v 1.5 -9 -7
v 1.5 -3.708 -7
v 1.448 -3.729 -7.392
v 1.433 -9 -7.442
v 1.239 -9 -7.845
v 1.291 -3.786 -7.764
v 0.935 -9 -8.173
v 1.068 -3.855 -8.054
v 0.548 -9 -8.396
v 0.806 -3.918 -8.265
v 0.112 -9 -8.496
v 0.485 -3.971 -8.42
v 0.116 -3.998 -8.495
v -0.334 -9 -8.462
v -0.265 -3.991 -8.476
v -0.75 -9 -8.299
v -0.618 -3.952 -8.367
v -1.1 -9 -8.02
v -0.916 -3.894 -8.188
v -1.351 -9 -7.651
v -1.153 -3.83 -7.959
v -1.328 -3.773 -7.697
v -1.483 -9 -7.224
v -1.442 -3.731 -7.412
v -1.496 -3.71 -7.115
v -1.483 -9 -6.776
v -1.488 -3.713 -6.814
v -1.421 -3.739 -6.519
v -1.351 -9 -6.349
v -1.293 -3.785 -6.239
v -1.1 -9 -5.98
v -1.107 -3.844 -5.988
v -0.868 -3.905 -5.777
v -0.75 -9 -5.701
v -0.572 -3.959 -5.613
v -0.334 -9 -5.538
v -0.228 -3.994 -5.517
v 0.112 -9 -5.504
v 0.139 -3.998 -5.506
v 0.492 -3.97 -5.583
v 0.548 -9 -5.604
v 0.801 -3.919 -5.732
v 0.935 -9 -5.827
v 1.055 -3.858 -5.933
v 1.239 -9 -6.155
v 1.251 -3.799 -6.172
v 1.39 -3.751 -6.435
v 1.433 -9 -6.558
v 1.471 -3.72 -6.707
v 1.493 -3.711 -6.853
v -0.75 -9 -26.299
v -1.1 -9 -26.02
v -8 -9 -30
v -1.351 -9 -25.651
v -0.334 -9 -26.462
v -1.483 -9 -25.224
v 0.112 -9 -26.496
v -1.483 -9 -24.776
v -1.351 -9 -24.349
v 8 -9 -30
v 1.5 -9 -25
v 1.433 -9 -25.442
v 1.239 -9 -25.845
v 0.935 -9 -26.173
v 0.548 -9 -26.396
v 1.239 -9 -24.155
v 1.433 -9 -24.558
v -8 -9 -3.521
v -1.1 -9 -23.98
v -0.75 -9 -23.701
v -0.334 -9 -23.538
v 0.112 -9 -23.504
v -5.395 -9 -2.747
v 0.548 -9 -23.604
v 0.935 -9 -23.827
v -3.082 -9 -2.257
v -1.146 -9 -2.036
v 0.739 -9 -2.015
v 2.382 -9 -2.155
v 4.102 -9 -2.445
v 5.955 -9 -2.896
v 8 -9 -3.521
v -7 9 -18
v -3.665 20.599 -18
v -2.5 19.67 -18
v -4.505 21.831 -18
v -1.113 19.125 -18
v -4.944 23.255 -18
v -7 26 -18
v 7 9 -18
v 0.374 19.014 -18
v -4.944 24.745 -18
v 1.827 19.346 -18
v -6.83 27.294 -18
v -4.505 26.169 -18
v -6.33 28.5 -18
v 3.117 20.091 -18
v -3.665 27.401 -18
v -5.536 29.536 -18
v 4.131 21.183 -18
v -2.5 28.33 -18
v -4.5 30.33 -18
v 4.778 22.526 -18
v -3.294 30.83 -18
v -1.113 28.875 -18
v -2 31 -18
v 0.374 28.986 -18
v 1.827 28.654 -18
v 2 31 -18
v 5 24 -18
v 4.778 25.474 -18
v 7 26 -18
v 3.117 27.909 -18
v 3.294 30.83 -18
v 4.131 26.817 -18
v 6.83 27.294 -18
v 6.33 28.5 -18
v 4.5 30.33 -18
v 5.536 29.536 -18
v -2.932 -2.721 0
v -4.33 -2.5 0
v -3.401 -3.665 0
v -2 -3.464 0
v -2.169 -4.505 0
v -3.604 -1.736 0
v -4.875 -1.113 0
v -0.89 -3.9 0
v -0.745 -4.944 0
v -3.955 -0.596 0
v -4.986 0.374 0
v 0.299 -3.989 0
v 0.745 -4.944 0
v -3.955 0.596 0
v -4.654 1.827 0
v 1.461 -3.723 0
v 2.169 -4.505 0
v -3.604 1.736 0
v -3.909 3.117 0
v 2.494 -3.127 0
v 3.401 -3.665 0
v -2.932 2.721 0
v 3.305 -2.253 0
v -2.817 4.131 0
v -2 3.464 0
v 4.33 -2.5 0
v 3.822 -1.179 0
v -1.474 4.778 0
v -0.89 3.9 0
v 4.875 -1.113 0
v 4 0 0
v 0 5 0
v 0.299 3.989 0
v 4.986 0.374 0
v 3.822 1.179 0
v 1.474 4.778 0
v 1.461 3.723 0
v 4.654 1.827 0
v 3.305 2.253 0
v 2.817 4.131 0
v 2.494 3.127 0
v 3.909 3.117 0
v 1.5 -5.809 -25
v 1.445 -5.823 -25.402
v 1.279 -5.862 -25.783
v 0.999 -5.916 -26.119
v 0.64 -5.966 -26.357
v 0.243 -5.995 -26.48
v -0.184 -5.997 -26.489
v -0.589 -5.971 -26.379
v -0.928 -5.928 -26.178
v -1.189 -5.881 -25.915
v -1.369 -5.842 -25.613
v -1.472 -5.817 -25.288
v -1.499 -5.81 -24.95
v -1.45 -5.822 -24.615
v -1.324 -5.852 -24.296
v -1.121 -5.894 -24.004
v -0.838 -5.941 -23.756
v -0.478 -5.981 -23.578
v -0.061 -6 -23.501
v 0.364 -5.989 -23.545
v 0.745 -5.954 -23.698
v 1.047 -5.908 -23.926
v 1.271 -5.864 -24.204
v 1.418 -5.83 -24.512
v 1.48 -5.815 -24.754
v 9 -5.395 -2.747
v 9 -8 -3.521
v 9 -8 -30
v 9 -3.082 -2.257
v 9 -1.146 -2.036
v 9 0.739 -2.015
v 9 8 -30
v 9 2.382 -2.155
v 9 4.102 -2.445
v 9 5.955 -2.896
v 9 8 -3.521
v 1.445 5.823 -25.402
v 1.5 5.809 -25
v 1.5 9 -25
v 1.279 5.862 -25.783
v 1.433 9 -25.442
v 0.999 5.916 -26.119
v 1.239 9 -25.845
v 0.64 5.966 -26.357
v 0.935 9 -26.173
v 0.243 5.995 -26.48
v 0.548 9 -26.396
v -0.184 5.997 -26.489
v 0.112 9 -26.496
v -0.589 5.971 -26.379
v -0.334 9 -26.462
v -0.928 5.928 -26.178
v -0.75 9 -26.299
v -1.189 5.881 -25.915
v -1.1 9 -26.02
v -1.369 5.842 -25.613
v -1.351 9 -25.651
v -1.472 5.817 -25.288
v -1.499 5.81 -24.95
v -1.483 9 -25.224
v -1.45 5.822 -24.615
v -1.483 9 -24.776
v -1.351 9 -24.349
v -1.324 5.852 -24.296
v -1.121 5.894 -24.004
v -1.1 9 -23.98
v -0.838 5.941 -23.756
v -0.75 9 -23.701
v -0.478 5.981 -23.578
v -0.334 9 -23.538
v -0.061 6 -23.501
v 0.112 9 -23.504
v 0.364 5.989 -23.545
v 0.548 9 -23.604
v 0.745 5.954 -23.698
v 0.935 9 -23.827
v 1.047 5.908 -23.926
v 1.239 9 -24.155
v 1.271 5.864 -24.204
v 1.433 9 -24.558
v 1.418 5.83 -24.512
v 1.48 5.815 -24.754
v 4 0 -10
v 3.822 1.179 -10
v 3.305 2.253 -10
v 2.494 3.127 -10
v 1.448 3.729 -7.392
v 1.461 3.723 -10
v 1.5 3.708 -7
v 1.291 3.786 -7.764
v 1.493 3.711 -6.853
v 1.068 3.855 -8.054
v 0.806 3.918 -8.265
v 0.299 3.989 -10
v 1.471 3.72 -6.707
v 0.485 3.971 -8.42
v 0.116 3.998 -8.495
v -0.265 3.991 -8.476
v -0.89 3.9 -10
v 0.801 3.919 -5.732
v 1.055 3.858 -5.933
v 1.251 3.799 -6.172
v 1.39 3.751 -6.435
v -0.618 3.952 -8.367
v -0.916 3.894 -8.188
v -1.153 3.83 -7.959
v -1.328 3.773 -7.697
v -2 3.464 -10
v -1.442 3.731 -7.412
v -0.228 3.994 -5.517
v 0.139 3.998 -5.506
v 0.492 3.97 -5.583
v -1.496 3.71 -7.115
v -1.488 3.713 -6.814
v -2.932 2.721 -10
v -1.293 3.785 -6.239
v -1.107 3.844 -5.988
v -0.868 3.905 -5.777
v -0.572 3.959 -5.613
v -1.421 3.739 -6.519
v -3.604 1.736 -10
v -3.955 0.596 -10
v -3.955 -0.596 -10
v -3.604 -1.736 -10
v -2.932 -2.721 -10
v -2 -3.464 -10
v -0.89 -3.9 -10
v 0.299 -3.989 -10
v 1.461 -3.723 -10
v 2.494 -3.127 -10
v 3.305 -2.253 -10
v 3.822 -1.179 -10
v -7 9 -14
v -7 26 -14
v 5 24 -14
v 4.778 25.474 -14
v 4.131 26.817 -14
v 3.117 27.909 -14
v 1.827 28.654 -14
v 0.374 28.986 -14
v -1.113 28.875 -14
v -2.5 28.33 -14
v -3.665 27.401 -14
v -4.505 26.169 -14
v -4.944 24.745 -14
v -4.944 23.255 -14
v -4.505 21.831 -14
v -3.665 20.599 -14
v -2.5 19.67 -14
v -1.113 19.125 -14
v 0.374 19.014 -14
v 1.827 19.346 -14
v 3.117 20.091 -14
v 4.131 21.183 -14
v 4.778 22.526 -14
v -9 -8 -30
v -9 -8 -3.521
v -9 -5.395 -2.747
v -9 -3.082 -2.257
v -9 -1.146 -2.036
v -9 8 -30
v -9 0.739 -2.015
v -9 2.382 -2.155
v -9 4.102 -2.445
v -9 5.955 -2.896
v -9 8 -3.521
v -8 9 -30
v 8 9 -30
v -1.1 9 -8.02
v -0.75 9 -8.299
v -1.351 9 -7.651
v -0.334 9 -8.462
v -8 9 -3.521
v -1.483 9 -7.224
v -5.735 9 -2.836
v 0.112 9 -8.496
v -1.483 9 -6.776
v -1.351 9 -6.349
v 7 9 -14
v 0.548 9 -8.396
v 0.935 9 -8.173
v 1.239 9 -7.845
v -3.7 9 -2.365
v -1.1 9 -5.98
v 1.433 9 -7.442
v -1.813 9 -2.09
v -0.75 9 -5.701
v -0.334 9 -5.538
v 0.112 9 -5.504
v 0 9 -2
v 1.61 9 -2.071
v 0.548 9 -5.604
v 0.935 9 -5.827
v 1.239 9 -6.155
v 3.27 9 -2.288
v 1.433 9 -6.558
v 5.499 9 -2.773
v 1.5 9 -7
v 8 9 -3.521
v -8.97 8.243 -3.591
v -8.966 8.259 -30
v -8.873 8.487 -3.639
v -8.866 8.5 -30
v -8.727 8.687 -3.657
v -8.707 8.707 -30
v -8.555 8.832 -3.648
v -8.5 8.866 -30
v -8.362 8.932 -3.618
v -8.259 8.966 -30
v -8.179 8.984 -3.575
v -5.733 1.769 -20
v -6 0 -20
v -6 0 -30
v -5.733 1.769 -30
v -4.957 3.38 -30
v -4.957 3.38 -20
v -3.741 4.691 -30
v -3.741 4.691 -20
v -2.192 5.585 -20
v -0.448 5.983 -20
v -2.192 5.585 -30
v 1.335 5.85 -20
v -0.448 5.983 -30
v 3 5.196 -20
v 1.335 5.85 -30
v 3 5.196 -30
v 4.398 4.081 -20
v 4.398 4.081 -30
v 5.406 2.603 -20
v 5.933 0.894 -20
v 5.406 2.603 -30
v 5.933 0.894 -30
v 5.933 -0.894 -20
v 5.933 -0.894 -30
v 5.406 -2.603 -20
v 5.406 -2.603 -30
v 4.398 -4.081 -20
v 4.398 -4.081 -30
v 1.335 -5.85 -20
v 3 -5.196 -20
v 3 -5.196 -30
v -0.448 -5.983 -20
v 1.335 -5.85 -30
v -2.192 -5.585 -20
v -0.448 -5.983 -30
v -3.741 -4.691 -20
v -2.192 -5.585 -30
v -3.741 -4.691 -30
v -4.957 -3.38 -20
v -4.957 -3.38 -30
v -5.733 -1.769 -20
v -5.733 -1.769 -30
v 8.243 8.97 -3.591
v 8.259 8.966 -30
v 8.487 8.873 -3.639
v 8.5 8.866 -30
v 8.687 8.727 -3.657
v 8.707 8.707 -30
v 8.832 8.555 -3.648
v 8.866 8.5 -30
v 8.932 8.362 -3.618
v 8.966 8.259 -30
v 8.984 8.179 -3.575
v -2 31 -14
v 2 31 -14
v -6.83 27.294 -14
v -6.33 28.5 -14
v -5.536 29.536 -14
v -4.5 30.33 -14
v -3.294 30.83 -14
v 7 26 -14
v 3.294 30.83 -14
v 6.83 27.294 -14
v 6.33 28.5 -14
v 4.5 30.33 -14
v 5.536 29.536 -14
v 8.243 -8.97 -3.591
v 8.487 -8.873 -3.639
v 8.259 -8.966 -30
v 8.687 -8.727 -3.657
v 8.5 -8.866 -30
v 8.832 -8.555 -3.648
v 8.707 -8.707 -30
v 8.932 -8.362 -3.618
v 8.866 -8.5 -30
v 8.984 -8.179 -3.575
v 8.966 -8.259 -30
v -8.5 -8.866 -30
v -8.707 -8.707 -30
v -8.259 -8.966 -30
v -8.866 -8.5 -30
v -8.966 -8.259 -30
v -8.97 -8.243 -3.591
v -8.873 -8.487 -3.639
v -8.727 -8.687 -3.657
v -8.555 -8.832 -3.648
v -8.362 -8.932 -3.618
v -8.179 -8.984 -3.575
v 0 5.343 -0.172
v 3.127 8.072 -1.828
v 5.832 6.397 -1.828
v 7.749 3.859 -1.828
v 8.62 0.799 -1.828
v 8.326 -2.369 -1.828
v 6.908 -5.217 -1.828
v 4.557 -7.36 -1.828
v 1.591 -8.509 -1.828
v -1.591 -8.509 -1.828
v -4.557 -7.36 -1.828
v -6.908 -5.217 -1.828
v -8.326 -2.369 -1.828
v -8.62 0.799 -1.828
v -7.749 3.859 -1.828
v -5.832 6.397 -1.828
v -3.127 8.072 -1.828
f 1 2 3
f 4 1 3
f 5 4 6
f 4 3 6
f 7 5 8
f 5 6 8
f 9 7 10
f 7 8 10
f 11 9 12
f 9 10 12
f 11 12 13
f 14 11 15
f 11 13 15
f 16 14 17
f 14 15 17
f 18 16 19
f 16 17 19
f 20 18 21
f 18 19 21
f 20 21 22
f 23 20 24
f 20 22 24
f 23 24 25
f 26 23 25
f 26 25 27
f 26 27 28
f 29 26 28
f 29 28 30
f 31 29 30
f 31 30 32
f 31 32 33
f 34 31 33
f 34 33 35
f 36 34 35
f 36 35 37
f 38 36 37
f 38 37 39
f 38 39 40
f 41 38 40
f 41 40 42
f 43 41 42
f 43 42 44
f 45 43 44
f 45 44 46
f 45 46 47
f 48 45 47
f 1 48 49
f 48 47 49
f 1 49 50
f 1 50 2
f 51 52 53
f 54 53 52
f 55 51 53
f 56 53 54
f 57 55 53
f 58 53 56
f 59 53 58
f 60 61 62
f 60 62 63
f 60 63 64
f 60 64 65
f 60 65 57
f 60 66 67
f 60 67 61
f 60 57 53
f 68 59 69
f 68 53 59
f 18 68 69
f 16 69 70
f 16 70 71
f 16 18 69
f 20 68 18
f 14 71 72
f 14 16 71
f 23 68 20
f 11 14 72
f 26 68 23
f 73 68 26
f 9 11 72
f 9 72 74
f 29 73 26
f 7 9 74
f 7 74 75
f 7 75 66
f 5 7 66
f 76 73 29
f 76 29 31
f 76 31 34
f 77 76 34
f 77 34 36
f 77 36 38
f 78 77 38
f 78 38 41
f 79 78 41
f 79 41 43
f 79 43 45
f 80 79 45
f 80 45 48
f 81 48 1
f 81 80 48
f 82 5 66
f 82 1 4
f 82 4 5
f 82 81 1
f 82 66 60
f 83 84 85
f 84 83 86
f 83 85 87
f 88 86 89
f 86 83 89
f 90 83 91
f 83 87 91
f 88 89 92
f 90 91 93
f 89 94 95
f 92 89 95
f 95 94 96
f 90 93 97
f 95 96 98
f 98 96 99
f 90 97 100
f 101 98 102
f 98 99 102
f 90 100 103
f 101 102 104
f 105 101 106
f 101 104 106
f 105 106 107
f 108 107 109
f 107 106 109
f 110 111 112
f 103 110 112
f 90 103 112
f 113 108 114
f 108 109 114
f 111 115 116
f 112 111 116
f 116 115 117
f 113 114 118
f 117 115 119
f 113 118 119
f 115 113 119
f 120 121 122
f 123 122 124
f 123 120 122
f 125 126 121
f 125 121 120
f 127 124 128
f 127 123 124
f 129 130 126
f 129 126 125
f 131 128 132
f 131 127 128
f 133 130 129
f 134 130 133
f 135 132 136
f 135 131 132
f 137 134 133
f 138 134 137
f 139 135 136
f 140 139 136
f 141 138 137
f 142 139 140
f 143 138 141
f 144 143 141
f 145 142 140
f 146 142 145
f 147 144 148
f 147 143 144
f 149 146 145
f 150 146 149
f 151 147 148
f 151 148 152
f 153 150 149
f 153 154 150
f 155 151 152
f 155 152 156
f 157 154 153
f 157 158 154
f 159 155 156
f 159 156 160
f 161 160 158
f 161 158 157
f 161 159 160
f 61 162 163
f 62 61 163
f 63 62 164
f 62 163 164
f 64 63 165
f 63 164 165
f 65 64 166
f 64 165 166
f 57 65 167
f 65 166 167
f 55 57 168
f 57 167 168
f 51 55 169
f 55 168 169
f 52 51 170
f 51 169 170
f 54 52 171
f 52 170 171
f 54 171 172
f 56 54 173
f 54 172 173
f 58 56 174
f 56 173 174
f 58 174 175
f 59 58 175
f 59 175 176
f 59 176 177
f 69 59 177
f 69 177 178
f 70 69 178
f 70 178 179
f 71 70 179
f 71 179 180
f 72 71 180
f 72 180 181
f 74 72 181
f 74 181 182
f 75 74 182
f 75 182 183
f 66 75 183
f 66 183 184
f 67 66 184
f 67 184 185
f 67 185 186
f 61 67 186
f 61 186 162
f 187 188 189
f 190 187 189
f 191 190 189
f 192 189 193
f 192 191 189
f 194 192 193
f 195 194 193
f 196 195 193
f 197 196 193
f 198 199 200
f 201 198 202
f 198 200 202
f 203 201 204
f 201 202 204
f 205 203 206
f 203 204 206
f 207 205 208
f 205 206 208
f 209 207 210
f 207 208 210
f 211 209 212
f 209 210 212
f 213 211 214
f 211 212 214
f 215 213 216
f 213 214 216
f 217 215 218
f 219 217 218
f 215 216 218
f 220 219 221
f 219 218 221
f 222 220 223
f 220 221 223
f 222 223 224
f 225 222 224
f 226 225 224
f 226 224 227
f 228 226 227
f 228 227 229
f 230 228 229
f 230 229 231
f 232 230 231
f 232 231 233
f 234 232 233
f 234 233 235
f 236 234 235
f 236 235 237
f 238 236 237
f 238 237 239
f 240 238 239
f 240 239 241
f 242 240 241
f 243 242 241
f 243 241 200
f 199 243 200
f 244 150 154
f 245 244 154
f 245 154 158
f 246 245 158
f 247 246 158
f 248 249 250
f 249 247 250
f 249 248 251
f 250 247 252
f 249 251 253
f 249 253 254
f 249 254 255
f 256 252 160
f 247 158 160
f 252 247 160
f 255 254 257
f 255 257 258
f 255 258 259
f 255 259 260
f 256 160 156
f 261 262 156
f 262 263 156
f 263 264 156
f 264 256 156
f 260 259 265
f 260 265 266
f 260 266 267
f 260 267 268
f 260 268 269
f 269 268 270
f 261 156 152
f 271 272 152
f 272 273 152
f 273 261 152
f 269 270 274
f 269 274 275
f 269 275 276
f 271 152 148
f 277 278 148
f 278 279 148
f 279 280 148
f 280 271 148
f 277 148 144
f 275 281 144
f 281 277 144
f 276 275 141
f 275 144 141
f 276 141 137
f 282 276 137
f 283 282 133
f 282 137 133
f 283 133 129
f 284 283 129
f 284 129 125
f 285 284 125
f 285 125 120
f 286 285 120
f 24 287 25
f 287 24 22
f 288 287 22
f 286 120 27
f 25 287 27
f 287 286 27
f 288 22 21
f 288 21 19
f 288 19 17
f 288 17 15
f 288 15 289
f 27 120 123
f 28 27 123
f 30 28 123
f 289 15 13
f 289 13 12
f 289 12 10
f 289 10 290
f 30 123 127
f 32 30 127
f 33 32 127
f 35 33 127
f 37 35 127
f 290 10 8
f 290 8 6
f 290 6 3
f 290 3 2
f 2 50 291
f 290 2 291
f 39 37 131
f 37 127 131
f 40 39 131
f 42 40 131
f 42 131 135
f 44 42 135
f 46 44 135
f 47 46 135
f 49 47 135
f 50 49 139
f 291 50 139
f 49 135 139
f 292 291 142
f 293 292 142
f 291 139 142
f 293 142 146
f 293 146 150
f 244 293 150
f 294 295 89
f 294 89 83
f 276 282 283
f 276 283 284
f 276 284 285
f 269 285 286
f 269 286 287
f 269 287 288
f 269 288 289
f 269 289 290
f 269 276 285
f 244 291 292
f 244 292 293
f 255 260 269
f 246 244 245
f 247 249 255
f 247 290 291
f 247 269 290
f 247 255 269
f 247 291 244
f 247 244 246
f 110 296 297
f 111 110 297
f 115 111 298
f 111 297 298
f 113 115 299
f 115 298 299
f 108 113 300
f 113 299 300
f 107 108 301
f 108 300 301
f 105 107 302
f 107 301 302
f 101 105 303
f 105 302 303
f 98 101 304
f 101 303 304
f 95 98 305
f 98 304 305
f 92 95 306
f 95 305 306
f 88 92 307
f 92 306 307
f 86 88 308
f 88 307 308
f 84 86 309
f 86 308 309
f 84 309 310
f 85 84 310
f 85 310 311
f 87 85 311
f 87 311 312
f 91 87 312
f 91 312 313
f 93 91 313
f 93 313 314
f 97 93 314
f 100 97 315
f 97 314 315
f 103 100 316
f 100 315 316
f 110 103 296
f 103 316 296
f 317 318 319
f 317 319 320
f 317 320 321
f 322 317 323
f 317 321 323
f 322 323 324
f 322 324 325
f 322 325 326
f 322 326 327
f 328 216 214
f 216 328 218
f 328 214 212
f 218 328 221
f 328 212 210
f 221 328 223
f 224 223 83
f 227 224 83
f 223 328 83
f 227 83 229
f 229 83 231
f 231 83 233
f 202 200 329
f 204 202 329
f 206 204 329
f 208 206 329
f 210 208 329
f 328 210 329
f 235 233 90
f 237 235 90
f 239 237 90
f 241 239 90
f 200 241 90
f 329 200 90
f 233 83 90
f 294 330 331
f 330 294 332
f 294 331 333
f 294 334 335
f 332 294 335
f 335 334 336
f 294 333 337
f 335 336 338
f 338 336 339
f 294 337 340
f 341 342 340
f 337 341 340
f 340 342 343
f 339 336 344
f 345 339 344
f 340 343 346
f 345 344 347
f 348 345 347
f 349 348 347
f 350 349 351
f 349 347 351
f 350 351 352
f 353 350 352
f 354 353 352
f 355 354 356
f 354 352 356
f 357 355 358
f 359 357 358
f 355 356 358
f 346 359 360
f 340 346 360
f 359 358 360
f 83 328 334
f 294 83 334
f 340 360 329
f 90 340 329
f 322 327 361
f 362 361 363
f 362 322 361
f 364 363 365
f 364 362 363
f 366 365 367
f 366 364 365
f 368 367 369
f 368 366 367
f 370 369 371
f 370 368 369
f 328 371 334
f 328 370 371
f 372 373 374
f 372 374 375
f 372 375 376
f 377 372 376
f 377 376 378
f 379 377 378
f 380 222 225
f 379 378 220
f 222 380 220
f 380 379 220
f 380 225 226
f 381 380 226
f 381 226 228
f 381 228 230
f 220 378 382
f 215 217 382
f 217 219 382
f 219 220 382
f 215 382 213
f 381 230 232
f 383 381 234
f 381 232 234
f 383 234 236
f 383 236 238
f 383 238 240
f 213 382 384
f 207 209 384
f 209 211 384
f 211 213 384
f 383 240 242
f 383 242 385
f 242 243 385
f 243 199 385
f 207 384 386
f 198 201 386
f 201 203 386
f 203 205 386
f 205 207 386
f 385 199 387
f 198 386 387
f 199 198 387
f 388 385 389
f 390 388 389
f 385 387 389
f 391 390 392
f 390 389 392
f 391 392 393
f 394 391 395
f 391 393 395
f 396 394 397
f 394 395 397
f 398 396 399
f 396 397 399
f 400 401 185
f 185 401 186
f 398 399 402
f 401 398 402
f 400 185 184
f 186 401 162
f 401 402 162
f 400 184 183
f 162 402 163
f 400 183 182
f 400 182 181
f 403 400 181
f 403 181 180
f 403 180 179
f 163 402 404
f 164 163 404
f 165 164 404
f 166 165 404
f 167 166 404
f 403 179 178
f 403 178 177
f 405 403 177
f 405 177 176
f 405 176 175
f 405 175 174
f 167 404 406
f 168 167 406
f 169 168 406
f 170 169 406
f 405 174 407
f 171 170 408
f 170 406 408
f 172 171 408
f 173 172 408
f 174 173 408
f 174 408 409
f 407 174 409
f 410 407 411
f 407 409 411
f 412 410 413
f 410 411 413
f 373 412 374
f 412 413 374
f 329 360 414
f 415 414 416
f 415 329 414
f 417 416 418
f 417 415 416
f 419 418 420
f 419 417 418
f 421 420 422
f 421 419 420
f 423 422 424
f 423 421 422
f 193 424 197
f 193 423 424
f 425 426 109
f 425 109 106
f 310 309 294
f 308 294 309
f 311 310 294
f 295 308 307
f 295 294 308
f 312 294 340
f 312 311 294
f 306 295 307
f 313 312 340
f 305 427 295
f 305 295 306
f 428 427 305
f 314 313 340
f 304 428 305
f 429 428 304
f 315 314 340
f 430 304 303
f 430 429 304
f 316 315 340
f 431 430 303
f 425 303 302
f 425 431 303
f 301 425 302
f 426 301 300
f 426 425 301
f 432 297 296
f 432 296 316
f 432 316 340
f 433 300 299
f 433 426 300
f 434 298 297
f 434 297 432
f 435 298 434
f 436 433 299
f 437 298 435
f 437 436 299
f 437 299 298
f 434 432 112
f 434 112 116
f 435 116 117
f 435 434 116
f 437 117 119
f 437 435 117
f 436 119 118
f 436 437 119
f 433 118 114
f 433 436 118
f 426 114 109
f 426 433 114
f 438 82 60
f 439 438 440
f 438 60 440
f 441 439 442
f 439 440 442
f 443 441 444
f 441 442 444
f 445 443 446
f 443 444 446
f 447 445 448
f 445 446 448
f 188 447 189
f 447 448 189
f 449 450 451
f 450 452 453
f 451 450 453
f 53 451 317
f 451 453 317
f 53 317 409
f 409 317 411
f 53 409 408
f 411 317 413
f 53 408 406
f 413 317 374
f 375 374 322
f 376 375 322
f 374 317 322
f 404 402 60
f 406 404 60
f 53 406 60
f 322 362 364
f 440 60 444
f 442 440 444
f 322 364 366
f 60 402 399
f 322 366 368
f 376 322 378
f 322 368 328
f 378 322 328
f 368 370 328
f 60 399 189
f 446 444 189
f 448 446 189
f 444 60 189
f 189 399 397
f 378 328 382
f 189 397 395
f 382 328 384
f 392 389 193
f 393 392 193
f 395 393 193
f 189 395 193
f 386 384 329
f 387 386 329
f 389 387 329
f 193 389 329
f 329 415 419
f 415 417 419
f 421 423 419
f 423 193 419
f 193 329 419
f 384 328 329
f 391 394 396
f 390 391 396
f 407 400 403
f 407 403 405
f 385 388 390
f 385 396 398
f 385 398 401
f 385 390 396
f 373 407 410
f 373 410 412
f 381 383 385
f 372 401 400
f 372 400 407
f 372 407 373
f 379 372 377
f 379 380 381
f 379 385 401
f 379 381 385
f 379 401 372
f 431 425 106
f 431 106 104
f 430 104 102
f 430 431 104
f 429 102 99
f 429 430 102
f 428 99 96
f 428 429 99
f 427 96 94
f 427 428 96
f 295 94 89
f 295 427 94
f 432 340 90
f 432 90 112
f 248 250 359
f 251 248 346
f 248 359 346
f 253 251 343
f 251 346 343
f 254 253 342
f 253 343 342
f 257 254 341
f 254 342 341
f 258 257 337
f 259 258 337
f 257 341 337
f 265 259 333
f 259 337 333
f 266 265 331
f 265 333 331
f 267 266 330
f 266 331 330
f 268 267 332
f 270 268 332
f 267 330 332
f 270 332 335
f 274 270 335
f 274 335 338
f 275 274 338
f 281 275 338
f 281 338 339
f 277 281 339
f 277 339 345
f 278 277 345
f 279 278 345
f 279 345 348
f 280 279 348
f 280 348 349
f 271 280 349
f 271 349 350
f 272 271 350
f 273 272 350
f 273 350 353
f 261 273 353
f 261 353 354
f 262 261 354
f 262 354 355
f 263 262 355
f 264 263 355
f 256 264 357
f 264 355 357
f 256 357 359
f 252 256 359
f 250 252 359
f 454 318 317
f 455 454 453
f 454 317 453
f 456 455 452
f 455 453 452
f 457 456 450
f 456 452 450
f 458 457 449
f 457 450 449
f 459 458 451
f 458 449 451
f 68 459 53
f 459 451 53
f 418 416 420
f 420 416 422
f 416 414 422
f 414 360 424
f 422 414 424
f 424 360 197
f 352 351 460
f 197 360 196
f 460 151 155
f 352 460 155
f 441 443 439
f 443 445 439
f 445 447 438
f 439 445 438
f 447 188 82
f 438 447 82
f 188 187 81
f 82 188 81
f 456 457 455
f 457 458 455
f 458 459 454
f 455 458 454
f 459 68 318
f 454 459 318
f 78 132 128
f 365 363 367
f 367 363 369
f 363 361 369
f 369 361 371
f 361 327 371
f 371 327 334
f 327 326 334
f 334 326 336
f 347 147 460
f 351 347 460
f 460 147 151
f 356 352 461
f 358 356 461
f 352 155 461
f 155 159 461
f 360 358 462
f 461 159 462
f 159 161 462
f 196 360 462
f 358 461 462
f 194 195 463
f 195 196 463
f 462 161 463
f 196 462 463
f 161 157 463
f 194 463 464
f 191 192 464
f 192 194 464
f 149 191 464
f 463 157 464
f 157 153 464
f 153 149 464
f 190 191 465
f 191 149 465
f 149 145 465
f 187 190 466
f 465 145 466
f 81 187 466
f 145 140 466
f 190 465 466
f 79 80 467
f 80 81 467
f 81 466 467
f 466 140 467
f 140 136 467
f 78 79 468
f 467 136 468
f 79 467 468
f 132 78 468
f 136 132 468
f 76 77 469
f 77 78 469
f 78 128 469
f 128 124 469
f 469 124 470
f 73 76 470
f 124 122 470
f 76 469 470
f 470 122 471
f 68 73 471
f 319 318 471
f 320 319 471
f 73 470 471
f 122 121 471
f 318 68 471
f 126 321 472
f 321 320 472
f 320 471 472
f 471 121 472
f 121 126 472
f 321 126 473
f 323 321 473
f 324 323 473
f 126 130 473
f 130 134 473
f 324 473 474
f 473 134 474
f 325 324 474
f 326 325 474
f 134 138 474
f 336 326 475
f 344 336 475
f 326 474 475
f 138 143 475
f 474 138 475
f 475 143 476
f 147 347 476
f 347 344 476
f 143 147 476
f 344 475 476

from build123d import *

# Parameters (mm, degrees)
SKETCH1_W           = 18
SKETCH1_H           = 18
BOSS_EXTRUDE1_DEPTH = 30
FILLET1_R           = 1
SKETCH3_R           = 4
CUT_EXTRUDE1_DEPTH  = 10
SKETCH4_R           = 6
CUT_EXTRUDE2_DEPTH  = 10
SKETCH5_R           = 1.5
CUT_EXTRUDE3_DEPTH  = 19.0000001
SKETCH7_R           = 5
BOSS_EXTRUDE2_DEPTH = 4


with BuildPart() as part:
    # Sketch1 → Boss-Extrude1 (new body)
    with BuildSketch(Plane.XY):
        Rectangle(SKETCH1_W, SKETCH1_H)
    extrude(amount=-BOSS_EXTRUDE1_DEPTH)

    # Sketch2 → Cut-Revolve1 (revolve, cut)
    with BuildSketch(Plane(origin=(0, 0, 0), x_dir=(0, 0, -1), z_dir=(1, 0, 0))):
        Polygon((0, 5), (0, 12.689629666), (3.844814833, 12.689629666), align=None)
    revolve(axis=Axis((0, 0, 0), (0, 0, -1)), mode=Mode.SUBTRACT)

    # Fillet1
    fillet1_edges = [part.edges().sort_by_distance(p)[0] for p in [
        (9, -9, -15),
        (-9, -9, -15),
        (-9, 9, -15),
        (9, 9, -15),
    ]]
    fillet(fillet1_edges, radius=FILLET1_R)

    # Sketch3 → Cut-Extrude1 (cut)
    with BuildSketch(Plane.XY):
        Circle(SKETCH3_R)
    extrude(amount=-CUT_EXTRUDE1_DEPTH, mode=Mode.SUBTRACT)

    # Sketch4 → Cut-Extrude2 (cut)
    with BuildSketch(Plane(origin=(0, 0, -30), x_dir=(-1, 0, 0), z_dir=(0, 0, -1))):
        Circle(SKETCH4_R)
    extrude(amount=-CUT_EXTRUDE2_DEPTH, mode=Mode.SUBTRACT)

    # Sketch5 → Cut-Extrude3 (cut, through all)
    with BuildSketch(Plane(origin=(0, 9, 0), x_dir=(1, 0, 0), z_dir=(0, 1, 0))):
        with Locations((0, 7)):
            Circle(SKETCH5_R)
        with Locations((0, 25)):
            Circle(SKETCH5_R)
    extrude(amount=-CUT_EXTRUDE3_DEPTH, mode=Mode.SUBTRACT)

    # Sketch7 → Boss-Extrude2 (add)
    with BuildSketch(Plane.XY.offset(-14)):
        with BuildLine():
            Line((-7, 9), (7, 9))
            Line((7, 9), (7, 26))
            ThreePointArc((7, 26), (5.535533906, 29.535533906), (2, 31))
            Line((2, 31), (-2, 31))
            ThreePointArc((-2, 31), (-5.535533906, 29.535533906), (-7, 26))
            Line((-7, 26), (-7, 9))
        make_face()
        with Locations((0, 24)):
            Circle(SKETCH7_R, mode=Mode.SUBTRACT)
    extrude(amount=-BOSS_EXTRUDE2_DEPTH)


solid = part.part
